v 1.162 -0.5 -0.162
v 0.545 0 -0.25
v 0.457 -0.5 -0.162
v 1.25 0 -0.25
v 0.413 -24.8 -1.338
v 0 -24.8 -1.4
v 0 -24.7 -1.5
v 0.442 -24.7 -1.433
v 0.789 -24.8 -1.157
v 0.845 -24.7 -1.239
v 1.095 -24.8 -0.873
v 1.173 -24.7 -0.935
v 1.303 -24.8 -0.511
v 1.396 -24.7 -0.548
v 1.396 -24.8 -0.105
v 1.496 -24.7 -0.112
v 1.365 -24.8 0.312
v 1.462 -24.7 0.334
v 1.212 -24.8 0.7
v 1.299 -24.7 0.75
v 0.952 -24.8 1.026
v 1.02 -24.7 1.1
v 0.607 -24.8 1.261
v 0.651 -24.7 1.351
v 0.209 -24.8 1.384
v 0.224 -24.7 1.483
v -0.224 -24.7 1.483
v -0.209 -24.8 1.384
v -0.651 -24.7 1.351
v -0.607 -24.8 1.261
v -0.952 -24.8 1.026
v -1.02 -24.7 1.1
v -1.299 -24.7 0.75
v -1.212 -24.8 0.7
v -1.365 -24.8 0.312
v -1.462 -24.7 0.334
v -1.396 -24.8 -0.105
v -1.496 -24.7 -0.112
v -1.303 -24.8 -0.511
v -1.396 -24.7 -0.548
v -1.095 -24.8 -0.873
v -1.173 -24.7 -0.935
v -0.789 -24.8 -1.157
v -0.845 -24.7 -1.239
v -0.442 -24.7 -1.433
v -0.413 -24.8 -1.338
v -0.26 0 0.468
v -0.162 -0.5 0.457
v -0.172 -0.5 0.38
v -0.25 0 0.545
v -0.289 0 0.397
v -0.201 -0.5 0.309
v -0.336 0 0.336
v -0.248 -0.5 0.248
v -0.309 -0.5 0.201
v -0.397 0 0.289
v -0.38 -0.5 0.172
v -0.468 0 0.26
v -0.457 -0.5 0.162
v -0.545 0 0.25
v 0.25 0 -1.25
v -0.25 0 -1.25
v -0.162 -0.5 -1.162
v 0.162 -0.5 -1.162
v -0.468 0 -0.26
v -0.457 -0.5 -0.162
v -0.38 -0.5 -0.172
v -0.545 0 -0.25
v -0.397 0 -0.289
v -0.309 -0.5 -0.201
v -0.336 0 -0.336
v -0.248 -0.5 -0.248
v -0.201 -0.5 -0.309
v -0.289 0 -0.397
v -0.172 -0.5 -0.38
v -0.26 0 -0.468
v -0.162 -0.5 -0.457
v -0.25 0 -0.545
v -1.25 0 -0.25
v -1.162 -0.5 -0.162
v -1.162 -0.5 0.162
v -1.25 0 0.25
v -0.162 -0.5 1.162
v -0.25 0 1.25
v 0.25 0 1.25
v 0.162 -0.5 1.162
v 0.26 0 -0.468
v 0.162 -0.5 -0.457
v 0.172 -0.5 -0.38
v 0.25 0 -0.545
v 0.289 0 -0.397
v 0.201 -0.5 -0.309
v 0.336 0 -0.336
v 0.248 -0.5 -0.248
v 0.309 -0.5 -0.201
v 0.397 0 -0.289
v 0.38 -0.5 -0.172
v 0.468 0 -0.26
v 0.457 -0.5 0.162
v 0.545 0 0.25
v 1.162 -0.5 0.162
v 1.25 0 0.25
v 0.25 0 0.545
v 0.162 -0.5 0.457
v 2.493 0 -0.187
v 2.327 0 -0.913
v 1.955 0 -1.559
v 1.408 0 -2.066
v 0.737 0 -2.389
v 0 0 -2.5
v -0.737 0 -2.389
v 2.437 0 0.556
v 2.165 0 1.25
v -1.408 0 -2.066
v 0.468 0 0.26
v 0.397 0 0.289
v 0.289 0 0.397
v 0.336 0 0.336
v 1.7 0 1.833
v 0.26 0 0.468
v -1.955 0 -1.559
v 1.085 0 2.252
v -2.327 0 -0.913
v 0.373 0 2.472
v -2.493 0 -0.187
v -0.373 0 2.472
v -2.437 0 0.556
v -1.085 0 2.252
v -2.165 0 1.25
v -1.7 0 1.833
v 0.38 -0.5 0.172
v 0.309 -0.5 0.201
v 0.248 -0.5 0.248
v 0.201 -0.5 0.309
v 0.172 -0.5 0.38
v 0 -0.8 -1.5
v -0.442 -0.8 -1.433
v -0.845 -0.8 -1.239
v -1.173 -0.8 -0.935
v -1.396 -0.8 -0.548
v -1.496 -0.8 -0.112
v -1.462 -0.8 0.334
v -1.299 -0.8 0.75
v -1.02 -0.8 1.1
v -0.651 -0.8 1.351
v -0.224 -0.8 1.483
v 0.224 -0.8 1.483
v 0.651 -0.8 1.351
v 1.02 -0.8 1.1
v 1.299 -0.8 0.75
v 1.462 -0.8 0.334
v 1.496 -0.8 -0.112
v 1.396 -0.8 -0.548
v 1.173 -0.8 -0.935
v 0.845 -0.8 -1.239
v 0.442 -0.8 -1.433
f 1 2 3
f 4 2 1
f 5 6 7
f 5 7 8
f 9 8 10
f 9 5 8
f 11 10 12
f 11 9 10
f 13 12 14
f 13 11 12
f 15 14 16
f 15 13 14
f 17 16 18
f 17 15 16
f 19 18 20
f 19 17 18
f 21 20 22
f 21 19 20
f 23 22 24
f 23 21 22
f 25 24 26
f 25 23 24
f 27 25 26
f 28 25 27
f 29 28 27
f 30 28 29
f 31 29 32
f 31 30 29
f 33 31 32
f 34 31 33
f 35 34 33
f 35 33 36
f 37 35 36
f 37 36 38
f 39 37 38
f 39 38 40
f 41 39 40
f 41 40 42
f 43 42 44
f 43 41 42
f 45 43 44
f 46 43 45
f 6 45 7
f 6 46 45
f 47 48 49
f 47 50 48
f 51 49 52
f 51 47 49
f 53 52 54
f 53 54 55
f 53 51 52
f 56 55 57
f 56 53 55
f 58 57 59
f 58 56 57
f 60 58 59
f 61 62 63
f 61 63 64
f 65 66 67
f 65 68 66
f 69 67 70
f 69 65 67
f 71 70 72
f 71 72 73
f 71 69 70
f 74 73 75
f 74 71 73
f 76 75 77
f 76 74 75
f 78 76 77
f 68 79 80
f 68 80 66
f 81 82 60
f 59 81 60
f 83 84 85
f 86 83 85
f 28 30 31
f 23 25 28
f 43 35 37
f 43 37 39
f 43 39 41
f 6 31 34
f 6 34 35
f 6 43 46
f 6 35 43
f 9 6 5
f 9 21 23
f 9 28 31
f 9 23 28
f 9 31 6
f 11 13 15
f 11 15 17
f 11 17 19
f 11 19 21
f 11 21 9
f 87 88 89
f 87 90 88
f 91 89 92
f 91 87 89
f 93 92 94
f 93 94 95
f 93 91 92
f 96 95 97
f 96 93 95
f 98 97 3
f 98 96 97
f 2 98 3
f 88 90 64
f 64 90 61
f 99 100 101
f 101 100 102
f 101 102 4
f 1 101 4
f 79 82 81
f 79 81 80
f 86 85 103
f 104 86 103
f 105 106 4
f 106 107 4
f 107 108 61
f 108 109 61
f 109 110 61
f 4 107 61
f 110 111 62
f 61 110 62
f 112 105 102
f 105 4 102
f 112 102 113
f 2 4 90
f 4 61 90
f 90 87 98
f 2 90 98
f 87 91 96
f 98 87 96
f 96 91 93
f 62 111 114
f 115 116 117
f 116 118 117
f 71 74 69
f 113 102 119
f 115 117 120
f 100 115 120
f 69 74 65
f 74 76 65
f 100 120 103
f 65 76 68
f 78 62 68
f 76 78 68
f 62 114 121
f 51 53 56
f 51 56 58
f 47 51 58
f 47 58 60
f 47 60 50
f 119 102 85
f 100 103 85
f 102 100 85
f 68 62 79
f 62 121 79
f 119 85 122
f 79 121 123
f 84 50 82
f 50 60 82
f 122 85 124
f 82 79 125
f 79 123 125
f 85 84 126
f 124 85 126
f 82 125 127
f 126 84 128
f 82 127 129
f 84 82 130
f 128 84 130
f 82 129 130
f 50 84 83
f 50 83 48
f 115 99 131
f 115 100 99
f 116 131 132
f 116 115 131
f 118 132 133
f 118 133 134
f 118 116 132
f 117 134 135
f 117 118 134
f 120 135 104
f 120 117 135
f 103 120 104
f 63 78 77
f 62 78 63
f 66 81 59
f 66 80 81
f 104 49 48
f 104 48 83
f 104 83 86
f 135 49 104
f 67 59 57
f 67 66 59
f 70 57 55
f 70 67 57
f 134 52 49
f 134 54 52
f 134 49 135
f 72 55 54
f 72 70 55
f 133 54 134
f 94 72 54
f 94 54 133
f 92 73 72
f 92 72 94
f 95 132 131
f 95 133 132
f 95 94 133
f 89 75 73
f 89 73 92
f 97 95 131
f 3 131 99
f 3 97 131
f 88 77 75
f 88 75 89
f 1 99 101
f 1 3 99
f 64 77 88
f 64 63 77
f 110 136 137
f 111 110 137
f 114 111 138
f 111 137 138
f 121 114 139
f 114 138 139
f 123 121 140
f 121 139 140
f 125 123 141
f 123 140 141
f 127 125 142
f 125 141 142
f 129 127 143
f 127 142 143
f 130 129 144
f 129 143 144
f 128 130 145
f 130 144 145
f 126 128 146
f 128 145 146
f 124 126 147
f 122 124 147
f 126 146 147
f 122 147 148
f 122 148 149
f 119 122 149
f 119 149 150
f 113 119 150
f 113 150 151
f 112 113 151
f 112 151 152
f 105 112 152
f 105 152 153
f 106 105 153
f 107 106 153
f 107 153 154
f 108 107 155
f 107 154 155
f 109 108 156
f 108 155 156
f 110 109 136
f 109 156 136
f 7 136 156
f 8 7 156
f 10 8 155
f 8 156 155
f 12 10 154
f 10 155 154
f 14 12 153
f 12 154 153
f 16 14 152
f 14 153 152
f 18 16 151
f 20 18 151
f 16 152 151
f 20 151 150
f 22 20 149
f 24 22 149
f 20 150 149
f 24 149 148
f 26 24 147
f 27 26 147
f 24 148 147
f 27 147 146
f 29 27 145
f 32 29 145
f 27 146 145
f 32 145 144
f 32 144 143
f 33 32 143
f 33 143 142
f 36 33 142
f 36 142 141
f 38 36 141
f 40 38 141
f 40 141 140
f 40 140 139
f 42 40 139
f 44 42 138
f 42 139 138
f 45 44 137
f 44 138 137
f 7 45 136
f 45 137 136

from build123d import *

# Parameters (mm, degrees)
SKETCH_2_R                    = 1.5
EXTRUDE_1_DEPTH               = 24
CHAMFER_1_SIZE                = 0.1
SKETCH_3_W                    = 2.5
SKETCH_3_H                    = 0.5
CUT_EXTRUDE_1_DEPTH           = 0.5
CUT_EXTRUDE_1_DRAFT           = -10
SKETCH_3_W_2                  = 0.5
SKETCH_3_H_2                  = 2.5
CUT_EXTRUDE_1_PROFILE_2_DEPTH = 0.5
CUT_EXTRUDE_1_PROFILE_2_DRAFT = -10
FILLET_1_R                    = 0.3


with BuildPart() as part:
    # 草图1 → 旋转1 (revolve)
    with BuildSketch(Plane.XY, mode=Mode.PRIVATE) as revolve_1_sk:
        Polygon((0, 0), (2.5, 0), (1.5, -0.8), (0, -0.8), align=None)
    revolve(revolve_1_sk.sketch.rotate(Axis((0, -0.8, 0), (0, 1, 0)), 90), axis=Axis((0, -0.8, 0), (0, 1, 0)))

    # 草图2 → 凸台-拉伸1 (add)
    with BuildSketch(Plane.XZ.offset(0.8)):
        with Locations(Location((0, 0, 0), (0, 0, 270))):
            Circle(SKETCH_2_R)
    extrude(amount=EXTRUDE_1_DEPTH)

    # 倒角1
    chamfer_1_edges = [part.edges().sort_by_distance(p)[0] for p in [
        (0, -24.8, 1.5),
    ]]
    chamfer(chamfer_1_edges, length=CHAMFER_1_SIZE)


with BuildPart() as cut_extrude_1_tool:
    # 草图3 → 切除-拉伸1 (with draft: the straight prism first)
    with BuildSketch(Plane(origin=(0, 0, 0), x_dir=(1, 0, 0), z_dir=(0, 1, 0))):
        Rectangle(SKETCH_3_W, SKETCH_3_H)
    extrude(amount=-CUT_EXTRUDE_1_DEPTH)
    # 切除-拉伸1: the draft: its side faces are tilted about the plane it starts from
    cut_extrude_1_sides = [cut_extrude_1_tool.faces().sort_by_distance(p)[0] for p in [
        (0, -0.25, 0.25),
        (1.25, -0.25, 0),
        (0, -0.25, -0.25),
        (-1.25, -0.25, 0),
    ]]
    draft(cut_extrude_1_sides, Plane(origin=(0, 0, 0), x_dir=(1, 0, 0), z_dir=(0, 1, 0)), CUT_EXTRUDE_1_DRAFT)


with BuildPart() as part_1:
    add(part.part)

    # 切除-拉伸1: cut by cut_extrude_1_tool
    add(cut_extrude_1_tool.part, mode=Mode.SUBTRACT)


with BuildPart() as cut_extrude_1_profile_2_tool:
    # 草图3 → 切除-拉伸1 profile 2 (with draft: the straight prism first)
    with BuildSketch(Plane(origin=(0, 0, 0), x_dir=(1, 0, 0), z_dir=(0, 1, 0))):
        Rectangle(SKETCH_3_W_2, SKETCH_3_H_2)
    extrude(amount=-CUT_EXTRUDE_1_PROFILE_2_DEPTH)
    # 切除-拉伸1 profile 2: the draft: its side faces are tilted about the plane it starts from
    cut_extrude_1_profile_2_sides = [cut_extrude_1_profile_2_tool.faces().sort_by_distance(p)[0] for p in [
        (-0.25, -0.25, 0),
        (0, -0.25, 1.25),
        (0.25, -0.25, 0),
        (0, -0.25, -1.25),
    ]]
    draft(cut_extrude_1_profile_2_sides, Plane(origin=(0, 0, 0), x_dir=(1, 0, 0), z_dir=(0, 1, 0)), CUT_EXTRUDE_1_PROFILE_2_DRAFT)


with BuildPart() as part_2:
    add(part_1.part)

    # 切除-拉伸1 profile 2: cut by cut_extrude_1_profile_2_tool
    add(cut_extrude_1_profile_2_tool.part, mode=Mode.SUBTRACT)

    # 圆角1
    fillet_1_edges = [part_2.edges().sort_by_distance(p)[0] for p in [
        (0.205918255, -0.25, -0.205918255),
        (0.205918255, -0.25, 0.205918255),
        (-0.205918255, -0.25, 0.205918255),
        (-0.205918255, -0.25, -0.205918255),
    ]]
    fillet(fillet_1_edges, radius=FILLET_1_R)


solid = part_2.part
